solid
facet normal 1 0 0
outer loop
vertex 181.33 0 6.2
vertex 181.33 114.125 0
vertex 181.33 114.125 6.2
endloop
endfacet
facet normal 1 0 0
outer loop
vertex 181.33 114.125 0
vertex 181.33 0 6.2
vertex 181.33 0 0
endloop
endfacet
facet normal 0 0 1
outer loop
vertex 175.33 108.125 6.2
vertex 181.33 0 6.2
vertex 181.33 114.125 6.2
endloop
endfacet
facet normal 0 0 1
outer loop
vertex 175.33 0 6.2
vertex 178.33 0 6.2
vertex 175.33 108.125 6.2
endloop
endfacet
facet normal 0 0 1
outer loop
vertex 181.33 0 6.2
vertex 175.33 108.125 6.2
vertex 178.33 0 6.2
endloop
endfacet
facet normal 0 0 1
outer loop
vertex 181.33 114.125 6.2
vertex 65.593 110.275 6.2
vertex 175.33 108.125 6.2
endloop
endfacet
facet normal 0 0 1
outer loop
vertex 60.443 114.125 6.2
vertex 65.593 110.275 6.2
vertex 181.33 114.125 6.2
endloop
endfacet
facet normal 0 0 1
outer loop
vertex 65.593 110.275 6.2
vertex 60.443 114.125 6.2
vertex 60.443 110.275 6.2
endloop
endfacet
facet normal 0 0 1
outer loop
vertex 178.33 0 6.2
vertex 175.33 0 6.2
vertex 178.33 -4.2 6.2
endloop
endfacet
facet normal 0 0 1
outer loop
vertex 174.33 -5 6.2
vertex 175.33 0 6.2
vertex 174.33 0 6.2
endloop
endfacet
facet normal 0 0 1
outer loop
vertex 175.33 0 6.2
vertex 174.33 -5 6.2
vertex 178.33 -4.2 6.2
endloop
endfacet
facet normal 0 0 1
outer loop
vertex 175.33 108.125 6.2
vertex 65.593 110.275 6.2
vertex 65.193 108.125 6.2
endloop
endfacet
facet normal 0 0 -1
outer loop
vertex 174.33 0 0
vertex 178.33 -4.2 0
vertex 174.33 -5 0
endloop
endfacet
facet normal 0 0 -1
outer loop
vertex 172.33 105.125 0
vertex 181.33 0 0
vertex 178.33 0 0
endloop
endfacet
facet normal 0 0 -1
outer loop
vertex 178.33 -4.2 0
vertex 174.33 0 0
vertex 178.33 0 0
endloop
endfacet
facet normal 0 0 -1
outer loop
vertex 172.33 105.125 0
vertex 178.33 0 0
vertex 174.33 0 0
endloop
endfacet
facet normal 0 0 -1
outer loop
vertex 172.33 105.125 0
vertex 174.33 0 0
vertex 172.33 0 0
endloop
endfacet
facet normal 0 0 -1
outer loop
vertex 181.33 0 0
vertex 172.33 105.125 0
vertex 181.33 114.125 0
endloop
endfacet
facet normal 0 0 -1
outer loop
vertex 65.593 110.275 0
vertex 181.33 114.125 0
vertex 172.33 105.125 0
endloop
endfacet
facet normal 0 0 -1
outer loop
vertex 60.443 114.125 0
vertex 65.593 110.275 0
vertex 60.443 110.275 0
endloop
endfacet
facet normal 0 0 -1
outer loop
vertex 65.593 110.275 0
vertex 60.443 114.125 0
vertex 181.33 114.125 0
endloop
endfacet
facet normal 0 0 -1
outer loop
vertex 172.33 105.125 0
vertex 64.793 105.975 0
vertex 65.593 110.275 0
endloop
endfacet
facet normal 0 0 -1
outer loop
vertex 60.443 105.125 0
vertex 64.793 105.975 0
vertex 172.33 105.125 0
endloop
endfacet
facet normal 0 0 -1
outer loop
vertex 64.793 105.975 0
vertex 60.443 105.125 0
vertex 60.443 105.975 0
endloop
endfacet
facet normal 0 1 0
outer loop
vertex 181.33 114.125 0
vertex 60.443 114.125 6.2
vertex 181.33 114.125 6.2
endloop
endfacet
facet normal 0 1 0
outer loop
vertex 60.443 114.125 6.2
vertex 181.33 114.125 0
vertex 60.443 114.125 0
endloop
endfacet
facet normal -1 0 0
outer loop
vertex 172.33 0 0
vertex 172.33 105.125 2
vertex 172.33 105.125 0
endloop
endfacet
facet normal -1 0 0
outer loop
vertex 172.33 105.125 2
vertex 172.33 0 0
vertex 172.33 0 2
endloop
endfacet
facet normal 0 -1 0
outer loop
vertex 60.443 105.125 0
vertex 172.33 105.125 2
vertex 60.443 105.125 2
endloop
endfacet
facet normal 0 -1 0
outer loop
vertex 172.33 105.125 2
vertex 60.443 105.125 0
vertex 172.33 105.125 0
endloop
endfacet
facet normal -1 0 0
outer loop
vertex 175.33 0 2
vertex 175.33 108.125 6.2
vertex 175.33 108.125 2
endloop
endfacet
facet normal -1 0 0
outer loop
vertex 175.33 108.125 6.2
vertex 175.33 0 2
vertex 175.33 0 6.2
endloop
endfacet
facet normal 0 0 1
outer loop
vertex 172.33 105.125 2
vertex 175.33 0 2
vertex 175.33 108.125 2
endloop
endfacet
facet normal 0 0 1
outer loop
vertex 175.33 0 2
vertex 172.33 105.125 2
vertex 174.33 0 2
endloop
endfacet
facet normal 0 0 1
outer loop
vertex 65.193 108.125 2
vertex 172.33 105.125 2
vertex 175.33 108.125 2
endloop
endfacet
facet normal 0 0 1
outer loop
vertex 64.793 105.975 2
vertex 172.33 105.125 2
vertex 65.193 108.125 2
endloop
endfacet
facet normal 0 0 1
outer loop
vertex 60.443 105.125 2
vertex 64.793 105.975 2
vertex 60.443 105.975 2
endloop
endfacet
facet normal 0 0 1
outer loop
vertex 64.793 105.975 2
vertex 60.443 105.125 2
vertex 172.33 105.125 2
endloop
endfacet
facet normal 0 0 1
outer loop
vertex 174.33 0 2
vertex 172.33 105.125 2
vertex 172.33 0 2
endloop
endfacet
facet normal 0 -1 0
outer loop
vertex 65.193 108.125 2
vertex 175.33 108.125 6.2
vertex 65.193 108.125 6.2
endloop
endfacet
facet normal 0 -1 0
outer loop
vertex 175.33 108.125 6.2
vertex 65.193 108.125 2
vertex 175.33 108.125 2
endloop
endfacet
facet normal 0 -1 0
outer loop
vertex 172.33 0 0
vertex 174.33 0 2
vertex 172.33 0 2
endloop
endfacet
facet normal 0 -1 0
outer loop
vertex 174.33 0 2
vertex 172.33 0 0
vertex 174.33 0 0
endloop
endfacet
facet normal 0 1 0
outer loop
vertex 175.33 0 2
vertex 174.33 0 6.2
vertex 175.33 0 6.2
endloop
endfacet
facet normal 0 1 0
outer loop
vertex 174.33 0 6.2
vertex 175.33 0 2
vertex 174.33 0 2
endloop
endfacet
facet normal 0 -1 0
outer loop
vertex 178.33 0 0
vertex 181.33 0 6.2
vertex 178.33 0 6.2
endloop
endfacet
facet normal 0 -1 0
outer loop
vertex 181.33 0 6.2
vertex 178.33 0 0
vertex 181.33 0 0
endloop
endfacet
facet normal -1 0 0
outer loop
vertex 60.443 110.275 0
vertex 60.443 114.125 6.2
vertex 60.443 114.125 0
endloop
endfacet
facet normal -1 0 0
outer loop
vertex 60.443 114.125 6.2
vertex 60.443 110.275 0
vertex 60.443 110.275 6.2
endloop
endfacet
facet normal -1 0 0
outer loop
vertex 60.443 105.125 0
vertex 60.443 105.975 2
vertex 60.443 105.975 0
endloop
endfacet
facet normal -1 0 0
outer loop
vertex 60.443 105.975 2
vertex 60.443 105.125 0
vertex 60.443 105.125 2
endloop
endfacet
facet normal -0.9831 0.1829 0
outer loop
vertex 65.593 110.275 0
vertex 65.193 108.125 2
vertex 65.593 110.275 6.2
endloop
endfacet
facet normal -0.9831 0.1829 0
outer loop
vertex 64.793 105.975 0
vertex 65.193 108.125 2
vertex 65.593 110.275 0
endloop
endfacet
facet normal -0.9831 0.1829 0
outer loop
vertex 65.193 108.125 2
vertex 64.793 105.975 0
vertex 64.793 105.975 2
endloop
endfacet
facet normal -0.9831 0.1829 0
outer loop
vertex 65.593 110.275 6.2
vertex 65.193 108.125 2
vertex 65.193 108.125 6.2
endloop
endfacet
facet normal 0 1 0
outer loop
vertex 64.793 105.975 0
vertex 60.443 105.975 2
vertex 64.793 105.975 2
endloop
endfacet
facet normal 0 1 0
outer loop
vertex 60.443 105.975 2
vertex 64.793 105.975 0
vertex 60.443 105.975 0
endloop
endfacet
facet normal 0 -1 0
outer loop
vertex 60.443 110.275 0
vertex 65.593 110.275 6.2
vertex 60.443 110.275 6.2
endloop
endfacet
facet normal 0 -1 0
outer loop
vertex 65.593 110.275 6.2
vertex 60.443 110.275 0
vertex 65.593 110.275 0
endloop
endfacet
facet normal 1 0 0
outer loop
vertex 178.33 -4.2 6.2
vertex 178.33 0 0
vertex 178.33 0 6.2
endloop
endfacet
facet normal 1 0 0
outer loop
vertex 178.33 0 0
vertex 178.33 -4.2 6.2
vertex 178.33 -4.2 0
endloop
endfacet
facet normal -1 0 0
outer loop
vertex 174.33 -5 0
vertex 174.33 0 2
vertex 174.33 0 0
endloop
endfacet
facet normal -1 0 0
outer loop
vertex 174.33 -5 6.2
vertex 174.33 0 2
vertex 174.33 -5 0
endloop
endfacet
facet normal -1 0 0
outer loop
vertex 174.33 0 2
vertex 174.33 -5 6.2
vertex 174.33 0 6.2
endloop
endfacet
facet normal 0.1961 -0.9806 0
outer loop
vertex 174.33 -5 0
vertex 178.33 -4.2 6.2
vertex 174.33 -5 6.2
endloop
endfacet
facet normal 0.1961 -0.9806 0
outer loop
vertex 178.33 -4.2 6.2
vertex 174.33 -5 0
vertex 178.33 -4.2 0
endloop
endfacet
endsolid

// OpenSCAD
// ============================================
// Plate 8: 프레임 - 상단 우 (TR)
// 크기: ~121 x ~114 mm (OK)
// ============================================
use <../src/model_a_frame.scad>

frame_seg_TR();
